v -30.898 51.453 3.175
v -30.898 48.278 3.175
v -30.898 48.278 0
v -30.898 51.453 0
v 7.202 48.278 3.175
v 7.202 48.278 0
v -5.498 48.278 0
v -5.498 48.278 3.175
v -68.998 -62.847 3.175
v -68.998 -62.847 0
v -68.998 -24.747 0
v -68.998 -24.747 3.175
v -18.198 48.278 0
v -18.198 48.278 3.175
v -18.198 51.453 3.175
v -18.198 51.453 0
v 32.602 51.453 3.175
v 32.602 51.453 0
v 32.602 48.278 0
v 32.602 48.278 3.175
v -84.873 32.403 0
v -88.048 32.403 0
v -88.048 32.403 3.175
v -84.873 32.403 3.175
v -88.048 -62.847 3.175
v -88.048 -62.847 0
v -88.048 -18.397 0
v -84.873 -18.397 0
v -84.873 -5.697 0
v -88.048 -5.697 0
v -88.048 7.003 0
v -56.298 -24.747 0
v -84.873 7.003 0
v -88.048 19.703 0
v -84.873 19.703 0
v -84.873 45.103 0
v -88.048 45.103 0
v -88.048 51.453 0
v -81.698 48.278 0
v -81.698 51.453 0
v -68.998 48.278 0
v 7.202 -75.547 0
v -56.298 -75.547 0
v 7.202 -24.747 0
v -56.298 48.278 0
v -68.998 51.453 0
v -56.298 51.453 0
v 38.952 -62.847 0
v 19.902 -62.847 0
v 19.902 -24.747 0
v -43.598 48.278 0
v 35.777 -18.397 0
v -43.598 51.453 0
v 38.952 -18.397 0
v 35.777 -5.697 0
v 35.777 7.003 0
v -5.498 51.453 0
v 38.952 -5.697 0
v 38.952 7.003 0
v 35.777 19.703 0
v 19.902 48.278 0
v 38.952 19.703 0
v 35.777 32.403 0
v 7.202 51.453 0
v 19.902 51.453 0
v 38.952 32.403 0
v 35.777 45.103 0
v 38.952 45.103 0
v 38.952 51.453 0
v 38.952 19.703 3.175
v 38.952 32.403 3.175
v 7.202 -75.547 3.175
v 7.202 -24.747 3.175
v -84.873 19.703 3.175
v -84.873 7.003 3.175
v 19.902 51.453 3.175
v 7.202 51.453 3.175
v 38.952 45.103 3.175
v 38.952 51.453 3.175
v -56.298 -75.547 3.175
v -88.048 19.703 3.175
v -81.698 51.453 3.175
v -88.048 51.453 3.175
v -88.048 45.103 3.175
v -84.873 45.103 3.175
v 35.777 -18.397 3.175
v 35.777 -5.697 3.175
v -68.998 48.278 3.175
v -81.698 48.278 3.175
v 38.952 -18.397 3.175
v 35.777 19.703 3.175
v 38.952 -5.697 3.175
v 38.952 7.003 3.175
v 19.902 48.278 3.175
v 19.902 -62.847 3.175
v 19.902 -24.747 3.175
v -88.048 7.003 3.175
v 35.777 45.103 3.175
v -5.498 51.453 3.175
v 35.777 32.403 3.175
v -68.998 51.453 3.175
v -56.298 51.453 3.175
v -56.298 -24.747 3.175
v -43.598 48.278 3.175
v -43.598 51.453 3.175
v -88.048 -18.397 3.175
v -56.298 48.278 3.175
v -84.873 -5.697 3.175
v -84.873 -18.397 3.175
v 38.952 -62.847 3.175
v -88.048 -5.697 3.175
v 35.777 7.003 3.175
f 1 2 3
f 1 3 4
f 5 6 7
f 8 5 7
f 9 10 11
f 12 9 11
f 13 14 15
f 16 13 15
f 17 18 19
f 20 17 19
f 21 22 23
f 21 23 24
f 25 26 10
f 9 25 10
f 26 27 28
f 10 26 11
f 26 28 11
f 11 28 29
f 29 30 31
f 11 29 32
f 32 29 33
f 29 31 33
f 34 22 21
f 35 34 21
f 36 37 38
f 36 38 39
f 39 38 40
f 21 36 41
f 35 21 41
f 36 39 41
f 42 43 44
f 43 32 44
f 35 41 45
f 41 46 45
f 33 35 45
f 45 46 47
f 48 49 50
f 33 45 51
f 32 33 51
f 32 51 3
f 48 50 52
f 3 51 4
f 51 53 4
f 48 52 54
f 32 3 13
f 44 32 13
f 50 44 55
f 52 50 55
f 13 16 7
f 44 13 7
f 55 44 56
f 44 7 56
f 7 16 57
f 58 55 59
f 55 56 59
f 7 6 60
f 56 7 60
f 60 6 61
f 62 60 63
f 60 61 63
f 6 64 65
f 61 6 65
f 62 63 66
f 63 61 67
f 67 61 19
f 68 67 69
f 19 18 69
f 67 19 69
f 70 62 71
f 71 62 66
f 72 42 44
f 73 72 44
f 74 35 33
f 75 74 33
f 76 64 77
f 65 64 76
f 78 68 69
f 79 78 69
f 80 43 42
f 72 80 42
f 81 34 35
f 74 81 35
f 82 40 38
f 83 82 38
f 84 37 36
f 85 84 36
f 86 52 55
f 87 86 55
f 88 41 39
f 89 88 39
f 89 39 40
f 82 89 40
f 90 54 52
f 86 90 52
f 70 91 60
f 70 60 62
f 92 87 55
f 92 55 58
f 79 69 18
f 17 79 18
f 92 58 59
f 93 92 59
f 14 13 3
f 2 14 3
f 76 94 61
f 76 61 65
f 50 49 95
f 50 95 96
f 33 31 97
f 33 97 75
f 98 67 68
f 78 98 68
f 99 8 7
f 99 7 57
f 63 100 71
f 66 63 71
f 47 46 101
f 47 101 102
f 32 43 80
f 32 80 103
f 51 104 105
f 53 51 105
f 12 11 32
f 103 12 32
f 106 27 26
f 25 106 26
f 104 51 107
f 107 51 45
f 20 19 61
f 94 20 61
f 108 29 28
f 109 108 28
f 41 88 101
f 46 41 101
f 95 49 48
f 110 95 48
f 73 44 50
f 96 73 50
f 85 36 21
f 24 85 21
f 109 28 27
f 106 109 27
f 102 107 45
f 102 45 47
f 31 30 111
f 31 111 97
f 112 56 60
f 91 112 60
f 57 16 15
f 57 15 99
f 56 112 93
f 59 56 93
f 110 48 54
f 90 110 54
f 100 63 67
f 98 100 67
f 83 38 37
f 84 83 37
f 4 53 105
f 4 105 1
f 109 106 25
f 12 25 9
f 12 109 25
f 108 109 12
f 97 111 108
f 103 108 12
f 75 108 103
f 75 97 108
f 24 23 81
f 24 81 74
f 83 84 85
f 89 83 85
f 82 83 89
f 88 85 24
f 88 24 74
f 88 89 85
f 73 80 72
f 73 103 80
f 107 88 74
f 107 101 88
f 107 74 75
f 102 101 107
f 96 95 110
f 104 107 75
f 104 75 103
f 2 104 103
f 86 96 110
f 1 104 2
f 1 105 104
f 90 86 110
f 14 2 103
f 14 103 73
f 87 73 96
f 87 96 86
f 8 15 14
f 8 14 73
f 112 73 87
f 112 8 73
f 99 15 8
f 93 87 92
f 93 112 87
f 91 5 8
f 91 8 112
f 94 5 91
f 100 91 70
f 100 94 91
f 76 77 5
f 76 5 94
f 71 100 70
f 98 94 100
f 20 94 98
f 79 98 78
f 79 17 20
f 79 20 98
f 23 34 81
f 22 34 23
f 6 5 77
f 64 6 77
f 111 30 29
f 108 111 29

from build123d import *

# Parameters (mm, degrees)
F0_W     = 31.75
F0_H     = 50.8
F0_W_2   = 3.175
F0_H_2   = 12.7
F0_W_3   = 12.7
F0_H_3   = 3.175
F0_W_4   = 19.05
F0_H_4   = 38.1
F1_DEPTH = 3.175


# Not quite as in the source:
# - a feature names something its author has since deleted; it is built from what else it names


with BuildPart() as f1:
    # F0 (on Top) → F1 (new body)
    with BuildSketch(Plane.XY):
        with Locations((-8.6727611423, -50.1471598029)):
            Rectangle(F0_W, F0_H)
        with Locations((-40.4227611423, -50.1471598029)):
            Rectangle(F0_W, F0_H)
        Polygon((-81.6977611423, 51.4528401971), (-88.0477611423, 51.4528401971), (-88.0477611423, 45.1028401971), (-84.8727611423, 45.1028401971), (-84.8727611423, 32.4028401971), (-84.8727611423, 19.7028401971), (-84.8727611423, 7.0028401971), (-84.8727611423, -5.6971598029), (-84.8727611423, -18.3971598029), (-88.0477611423, -18.3971598029), (-88.0477611423, -24.7471598029), (-68.9977611423, -24.7471598029), (-56.2977611423, -24.7471598029), (-24.5477611423, -24.7471598029), (7.2022388577, -24.7471598029), (19.9022388577, -24.7471598029), (38.9522388577, -24.7471598029), (38.9522388577, -18.3971598029), (35.7772388577, -18.3971598029), (35.7772388577, -5.6971598029), (35.7772388577, 7.0028401971), (35.7772388577, 19.7028401971), (35.7772388577, 32.4028401971), (35.7772388577, 45.1028401971), (38.9522388577, 45.1028401971), (38.9522388577, 51.4528401971), (32.6022388577, 51.4528401971), (32.6022388577, 48.2778401971), (19.9022388577, 48.2778401971), (7.2022388577, 48.2778401971), (-5.4977611423, 48.2778401971), (-18.1977611423, 48.2778401971), (-30.8977611423, 48.2778401971), (-43.5977611423, 48.2778401971), (-56.2977611423, 48.2778401971), (-68.9977611423, 48.2778401971), (-81.6977611423, 48.2778401971), align=None)
        with Locations((-86.4602611423, 26.0528401971)):
            Rectangle(F0_W_2, F0_H_2)
        with Locations((-86.4602611423, 0.6528401971)):
            Rectangle(F0_W_2, F0_H_2)
        with Locations((37.3647388577, 0.6528401971)):
            Rectangle(F0_W_2, F0_H_2)
        with Locations((37.3647388577, 26.0528401971)):
            Rectangle(F0_W_2, F0_H_2)
        with Locations((-62.6477611423, 49.8653401971)):
            Rectangle(F0_W_3, F0_H_3)
        with Locations((-11.8477611423, 49.8653401971)):
            Rectangle(F0_W_3, F0_H_3)
        with Locations((-37.2477611423, 49.8653401971)):
            Rectangle(F0_W_3, F0_H_3)
        with Locations((-78.5227611423, -43.7971598029)):
            Rectangle(F0_W_4, F0_H_4)
        with Locations((29.4272388577, -43.7971598029)):
            Rectangle(F0_W_4, F0_H_4)
        with Locations((13.5522388577, 49.8653401971)):
            Rectangle(F0_W_3, F0_H_3)
    extrude(amount=F1_DEPTH)


solid = f1.part
